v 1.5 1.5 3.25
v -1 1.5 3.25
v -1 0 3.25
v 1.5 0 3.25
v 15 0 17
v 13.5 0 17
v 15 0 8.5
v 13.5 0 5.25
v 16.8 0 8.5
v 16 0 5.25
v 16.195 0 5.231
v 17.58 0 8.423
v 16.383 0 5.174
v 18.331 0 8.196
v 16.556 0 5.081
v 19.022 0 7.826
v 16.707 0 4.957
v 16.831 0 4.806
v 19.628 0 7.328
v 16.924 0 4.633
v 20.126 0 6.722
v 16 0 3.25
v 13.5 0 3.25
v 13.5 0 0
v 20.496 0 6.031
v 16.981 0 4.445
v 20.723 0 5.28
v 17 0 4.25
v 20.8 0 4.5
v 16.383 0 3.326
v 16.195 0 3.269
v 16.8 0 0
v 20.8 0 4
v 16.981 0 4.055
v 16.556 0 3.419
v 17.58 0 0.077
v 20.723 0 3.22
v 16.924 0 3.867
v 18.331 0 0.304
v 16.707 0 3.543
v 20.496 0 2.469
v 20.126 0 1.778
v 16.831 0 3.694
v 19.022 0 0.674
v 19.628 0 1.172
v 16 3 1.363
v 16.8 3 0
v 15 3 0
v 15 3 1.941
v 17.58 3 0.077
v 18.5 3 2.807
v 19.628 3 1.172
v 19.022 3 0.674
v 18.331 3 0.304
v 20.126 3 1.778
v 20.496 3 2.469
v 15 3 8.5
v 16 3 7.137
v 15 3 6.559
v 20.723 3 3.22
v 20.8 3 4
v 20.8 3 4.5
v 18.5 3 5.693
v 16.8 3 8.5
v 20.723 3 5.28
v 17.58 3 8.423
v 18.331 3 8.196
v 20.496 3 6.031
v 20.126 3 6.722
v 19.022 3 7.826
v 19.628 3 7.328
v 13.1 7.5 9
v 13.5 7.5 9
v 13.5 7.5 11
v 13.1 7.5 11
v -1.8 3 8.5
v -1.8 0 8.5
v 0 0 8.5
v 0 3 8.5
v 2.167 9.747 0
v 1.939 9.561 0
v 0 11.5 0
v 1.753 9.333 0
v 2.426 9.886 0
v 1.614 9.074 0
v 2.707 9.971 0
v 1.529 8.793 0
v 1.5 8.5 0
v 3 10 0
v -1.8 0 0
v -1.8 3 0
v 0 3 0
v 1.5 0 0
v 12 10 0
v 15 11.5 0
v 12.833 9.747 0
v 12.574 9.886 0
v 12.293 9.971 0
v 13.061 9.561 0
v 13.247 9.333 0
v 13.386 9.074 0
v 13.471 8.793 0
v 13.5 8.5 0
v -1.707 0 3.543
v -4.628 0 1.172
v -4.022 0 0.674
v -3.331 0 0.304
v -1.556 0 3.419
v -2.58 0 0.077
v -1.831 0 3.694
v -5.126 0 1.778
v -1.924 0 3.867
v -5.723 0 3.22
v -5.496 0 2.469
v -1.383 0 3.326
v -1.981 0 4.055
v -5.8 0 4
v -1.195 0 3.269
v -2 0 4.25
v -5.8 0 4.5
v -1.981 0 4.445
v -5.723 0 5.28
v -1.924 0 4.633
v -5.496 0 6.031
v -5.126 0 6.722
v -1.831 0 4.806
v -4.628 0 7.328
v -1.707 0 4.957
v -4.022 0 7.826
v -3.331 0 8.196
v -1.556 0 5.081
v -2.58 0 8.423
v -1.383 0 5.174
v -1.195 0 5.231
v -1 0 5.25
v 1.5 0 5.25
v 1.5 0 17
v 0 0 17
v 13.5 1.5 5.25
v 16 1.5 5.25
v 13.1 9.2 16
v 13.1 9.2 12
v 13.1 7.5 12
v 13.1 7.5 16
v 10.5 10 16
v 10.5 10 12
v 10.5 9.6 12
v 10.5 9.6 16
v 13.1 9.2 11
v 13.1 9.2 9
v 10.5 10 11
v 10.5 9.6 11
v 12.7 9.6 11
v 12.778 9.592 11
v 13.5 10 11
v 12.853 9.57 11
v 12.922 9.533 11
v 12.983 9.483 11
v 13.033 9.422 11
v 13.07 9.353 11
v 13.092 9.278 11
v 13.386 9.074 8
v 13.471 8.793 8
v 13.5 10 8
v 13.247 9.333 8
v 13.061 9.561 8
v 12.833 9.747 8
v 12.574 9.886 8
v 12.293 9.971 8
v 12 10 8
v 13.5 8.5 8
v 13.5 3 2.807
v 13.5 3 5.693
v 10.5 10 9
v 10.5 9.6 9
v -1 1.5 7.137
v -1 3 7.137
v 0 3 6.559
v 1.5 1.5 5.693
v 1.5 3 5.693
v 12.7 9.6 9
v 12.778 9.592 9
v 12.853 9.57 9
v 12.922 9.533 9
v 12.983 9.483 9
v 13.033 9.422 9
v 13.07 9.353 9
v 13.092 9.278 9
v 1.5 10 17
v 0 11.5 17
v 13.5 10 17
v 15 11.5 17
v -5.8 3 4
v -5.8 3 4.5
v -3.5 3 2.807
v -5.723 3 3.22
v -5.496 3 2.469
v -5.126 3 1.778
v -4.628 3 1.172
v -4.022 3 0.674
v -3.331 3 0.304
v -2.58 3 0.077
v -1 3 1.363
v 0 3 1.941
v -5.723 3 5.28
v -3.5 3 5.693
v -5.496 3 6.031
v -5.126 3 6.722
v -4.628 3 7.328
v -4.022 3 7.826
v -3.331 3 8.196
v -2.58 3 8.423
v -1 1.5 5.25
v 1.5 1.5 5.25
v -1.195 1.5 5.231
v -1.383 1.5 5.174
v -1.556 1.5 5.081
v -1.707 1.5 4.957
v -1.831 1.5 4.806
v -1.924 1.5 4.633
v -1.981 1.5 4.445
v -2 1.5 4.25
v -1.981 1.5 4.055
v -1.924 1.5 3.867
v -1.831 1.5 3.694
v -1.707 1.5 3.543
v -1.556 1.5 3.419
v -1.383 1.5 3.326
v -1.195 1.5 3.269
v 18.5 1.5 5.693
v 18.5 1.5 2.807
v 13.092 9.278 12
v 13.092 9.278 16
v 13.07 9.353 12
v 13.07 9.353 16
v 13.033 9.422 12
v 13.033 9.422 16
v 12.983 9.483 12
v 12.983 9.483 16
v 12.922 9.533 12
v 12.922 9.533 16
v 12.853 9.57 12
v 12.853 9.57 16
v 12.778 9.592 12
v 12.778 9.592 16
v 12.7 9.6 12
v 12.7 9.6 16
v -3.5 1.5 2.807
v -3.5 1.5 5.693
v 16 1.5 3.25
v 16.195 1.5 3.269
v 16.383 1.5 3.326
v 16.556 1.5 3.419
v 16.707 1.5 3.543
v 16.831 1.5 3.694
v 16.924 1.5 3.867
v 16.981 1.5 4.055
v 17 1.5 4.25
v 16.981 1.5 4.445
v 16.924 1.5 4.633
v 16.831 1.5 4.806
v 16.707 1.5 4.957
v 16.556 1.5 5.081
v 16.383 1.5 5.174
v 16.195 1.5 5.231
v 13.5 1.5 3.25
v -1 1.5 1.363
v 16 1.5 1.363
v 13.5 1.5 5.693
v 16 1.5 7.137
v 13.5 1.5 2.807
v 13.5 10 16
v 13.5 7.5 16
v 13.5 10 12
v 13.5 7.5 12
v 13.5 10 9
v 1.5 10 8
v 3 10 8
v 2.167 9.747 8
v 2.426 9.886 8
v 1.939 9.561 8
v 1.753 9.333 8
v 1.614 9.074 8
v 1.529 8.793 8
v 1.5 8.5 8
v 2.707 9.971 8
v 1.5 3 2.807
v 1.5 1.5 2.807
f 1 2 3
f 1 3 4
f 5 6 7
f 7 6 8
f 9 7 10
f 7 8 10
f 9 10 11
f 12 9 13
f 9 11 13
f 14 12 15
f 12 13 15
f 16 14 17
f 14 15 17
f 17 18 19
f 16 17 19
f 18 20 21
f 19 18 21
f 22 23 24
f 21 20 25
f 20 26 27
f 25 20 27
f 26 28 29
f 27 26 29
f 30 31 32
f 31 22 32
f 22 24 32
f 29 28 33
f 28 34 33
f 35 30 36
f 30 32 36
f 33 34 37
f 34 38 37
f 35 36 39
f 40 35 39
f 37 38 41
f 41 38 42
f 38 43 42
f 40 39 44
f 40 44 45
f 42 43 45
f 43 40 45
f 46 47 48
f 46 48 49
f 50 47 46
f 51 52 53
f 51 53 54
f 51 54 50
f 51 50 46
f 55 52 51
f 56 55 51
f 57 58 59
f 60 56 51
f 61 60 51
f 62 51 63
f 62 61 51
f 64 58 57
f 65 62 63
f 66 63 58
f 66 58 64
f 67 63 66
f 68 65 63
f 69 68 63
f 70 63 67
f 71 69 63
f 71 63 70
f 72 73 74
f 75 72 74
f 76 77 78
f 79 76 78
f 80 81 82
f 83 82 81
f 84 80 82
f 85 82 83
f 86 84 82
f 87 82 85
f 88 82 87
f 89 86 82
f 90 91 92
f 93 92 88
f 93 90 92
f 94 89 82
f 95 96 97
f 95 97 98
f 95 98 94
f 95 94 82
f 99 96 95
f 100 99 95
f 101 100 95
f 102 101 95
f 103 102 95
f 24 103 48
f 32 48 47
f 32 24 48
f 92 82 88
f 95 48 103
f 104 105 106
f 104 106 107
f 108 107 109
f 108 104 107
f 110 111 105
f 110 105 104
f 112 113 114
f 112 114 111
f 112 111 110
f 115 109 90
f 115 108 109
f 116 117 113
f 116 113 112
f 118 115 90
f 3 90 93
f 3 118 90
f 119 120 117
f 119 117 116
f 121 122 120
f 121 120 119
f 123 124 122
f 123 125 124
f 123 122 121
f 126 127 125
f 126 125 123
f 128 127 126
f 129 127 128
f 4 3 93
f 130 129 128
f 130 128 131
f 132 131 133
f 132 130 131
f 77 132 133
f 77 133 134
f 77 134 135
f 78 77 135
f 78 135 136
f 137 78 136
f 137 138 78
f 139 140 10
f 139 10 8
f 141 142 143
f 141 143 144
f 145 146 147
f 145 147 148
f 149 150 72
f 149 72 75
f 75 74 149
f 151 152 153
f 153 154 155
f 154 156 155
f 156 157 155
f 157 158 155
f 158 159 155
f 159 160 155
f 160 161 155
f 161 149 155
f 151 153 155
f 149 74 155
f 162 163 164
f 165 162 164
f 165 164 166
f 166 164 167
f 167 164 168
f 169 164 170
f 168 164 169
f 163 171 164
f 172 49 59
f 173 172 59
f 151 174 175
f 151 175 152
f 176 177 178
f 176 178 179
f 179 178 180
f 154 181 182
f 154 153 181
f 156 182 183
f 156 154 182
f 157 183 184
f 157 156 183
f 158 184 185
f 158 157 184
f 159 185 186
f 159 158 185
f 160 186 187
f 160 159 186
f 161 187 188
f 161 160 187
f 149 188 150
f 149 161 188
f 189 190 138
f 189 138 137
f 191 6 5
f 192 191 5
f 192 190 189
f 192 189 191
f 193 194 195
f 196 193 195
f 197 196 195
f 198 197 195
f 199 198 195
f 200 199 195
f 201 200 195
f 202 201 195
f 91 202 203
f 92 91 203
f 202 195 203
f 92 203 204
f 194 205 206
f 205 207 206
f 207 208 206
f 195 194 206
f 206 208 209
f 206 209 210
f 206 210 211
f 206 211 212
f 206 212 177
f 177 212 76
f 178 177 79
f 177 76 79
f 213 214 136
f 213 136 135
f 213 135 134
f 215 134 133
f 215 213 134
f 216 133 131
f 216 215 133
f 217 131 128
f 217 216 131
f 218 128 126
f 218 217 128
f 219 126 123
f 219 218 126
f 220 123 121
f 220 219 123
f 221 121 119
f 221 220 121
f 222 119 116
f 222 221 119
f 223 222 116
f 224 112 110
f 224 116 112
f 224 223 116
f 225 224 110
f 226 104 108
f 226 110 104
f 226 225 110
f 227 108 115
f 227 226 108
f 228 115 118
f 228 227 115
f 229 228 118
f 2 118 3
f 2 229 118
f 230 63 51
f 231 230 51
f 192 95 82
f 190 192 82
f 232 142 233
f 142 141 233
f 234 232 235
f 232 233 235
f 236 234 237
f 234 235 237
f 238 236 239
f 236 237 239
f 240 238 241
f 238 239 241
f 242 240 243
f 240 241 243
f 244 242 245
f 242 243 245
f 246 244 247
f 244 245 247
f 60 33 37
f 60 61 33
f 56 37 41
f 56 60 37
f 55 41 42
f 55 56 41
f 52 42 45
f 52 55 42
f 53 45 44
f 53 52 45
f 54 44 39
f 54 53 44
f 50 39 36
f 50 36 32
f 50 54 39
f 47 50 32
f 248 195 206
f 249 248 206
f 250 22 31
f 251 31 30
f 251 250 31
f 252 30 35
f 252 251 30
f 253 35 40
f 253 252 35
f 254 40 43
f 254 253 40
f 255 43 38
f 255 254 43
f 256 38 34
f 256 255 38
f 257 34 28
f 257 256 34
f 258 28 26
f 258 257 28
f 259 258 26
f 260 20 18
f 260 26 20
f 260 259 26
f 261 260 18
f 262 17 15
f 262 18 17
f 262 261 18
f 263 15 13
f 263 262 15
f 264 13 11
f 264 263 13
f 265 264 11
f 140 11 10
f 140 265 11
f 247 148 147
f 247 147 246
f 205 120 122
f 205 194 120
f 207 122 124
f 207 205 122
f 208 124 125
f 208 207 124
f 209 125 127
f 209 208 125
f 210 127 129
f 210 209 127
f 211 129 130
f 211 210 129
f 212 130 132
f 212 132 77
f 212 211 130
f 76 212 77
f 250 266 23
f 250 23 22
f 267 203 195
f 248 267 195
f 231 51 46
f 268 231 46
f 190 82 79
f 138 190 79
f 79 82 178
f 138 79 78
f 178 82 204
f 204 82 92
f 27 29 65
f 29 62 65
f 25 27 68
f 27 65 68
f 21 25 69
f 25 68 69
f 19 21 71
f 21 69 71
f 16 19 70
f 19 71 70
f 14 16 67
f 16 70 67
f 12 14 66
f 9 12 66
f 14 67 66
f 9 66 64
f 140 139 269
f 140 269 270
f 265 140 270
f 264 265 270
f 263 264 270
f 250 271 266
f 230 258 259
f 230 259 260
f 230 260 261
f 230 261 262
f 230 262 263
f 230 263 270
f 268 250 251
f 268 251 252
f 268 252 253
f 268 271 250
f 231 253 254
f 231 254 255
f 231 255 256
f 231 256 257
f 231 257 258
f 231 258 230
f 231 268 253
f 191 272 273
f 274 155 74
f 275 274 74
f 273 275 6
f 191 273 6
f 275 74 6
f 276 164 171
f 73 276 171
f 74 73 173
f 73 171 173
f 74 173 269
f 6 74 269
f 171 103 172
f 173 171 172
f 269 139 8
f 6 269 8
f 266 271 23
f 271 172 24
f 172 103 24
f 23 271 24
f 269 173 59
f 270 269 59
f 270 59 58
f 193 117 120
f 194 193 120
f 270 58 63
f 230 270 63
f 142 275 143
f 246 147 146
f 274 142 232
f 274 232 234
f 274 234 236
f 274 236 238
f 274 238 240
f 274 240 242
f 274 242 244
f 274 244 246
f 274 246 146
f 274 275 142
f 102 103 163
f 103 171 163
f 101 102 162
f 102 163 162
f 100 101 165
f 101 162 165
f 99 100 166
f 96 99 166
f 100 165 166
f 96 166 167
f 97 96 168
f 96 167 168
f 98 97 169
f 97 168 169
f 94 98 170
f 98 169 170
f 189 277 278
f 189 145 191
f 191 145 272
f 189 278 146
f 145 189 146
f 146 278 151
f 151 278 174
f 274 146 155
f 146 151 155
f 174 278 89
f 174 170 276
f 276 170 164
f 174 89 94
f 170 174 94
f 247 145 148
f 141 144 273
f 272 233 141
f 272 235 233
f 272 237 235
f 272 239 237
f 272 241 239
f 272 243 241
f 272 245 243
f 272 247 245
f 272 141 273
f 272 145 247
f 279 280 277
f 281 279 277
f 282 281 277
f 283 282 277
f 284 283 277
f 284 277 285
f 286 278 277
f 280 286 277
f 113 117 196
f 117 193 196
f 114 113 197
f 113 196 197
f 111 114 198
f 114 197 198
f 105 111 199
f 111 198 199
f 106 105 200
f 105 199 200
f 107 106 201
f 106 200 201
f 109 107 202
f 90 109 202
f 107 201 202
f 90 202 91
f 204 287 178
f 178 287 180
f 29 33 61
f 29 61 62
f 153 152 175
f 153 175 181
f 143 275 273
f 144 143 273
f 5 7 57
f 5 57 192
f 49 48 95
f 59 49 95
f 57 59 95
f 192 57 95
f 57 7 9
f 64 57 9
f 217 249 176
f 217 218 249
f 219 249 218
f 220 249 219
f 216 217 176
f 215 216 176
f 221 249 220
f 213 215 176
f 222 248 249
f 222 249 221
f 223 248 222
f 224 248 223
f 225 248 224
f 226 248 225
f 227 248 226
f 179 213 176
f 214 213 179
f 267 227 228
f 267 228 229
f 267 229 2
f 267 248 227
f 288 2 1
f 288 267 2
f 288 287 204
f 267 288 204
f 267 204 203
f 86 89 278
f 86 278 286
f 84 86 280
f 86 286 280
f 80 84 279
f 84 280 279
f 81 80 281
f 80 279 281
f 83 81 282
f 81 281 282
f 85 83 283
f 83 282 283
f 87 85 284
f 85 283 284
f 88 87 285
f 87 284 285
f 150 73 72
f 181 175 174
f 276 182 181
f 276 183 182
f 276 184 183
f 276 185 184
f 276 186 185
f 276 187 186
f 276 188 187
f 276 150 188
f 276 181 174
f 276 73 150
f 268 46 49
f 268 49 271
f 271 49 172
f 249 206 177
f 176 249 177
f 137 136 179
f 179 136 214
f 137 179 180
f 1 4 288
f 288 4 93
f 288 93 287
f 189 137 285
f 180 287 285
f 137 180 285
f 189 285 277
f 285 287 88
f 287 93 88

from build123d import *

# Parameters (mm, degrees)
BOSS_EXTRUDE1_DEPTH    = 17
SKETCH10_W             = 3
SKETCH10_H             = 4
SKETCH10_H_2           = 2
BOSS_EXTRUDE8_DEPTH    = 0.4
SKETCH11_W             = 2
SKETCH11_H             = 2.1
SKETCH11_W_2           = 4
BOSS_EXTRUDE9_DEPTH    = 0.4
FILLET5_R              = 0.4
SPLIT2_SURFACE_1_BACK  = 26.421
SPLIT2_SURFACE_1_DEPTH = 52.842
SPLIT2_SURFACE_2_BACK  = 26.421
SPLIT2_SURFACE_2_DEPTH = 52.842
FILLET6_R              = 1.5
SKETCH13_W             = 5.8
SKETCH13_H             = 8.5
BOSS_EXTRUDE10_DEPTH   = 3
FILLET7_R              = 4
SPLIT3_SURFACE_3_BACK  = 34.598
SPLIT3_SURFACE_3_DEPTH = 69.196
SPLIT3_SURFACE_4_BACK  = 34.598
SPLIT3_SURFACE_4_DEPTH = 69.196
CUT_EXTRUDE1_DEPTH     = 1.5
CUT_EXTRUDE2_DEPTH     = 29.664263465


with BuildPart() as part:
    # Sketch1 → Boss-Extrude1 (new body)
    with BuildSketch(Plane.XY):
        Polygon((0, 0), (1.5, 0), (1.5, 10), (13.5, 10), (13.5, 0), (15, 0), (15, 11.5), (0, 11.5), (0, 10), align=None)
    extrude(amount=BOSS_EXTRUDE1_DEPTH)

    # Sketch10 → Boss-Extrude8 (add)
    with BuildSketch(Plane.XZ.offset(-10)):
        with Locations((12, 14)):
            Rectangle(SKETCH10_W, SKETCH10_H)
        with Locations((12, 10)):
            Rectangle(SKETCH10_W, SKETCH10_H_2)
    extrude(amount=BOSS_EXTRUDE8_DEPTH)

    # Sketch11 → Boss-Extrude9 (add)
    with BuildSketch(Plane.ZY.offset(-13.5)):
        with Locations((10, 8.55)):
            Rectangle(SKETCH11_W, SKETCH11_H)
        with Locations((14, 8.55)):
            Rectangle(SKETCH11_W_2, SKETCH11_H)
    extrude(amount=BOSS_EXTRUDE9_DEPTH)

    # Fillet5
    fillet5_edges = [part.edges().sort_by_distance(p)[0] for p in [
        (13.1, 9.6, 10),
        (13.1, 9.6, 14),
    ]]
    fillet(fillet5_edges, radius=FILLET5_R)


with BuildPart() as body_2:
    # Split2: the piece behind the surface
    add(part.part)
    # Split2 surface: a surface, the sketch's curves swept straight by 52.842 mm
    with BuildLine(Plane.XZ.offset(-SPLIT2_SURFACE_1_BACK), mode=Mode.PRIVATE) as split2_surface_1_path:
        Line((15, 8), (0, 8))
    split2_surface_1 = Shell.extrude(split2_surface_1_path.wire(), (0 * SPLIT2_SURFACE_1_DEPTH, -1 * SPLIT2_SURFACE_1_DEPTH, 0 * SPLIT2_SURFACE_1_DEPTH))
    split(bisect_by=split2_surface_1, keep=Keep.BOTTOM)


with BuildPart() as part_1:
    add(part.part)

    # Split2: split by a surface, the side it looks to stays
    # Split2 surface: a surface, the sketch's curves swept straight by 52.842 mm
    with BuildLine(Plane.XZ.offset(-SPLIT2_SURFACE_2_BACK), mode=Mode.PRIVATE) as split2_surface_2_path:
        Line((15, 8), (0, 8))
    split2_surface_2 = Shell.extrude(split2_surface_2_path.wire(), (0 * SPLIT2_SURFACE_2_DEPTH, -1 * SPLIT2_SURFACE_2_DEPTH, 0 * SPLIT2_SURFACE_2_DEPTH))
    split(bisect_by=split2_surface_2, keep=Keep.TOP)

    # Fillet6
    fillet6_edges = [part_1.edges().sort_by_distance(p)[0] for p in [
        (13.5, 10, 4),
        (1.5, 10, 4),
    ]]
    fillet(fillet6_edges, radius=FILLET6_R)


with BuildPart() as body_2_1:
    add(body_2.part)

    # Combine2: union part
    add(part_1.part)

    # Sketch13 → Boss-Extrude10 (add)
    with BuildSketch(Plane.XZ):
        with Locations((-2.9, 4.25)):
            Rectangle(SKETCH13_W, SKETCH13_H)
        with Locations((17.9, 4.25)):
            Rectangle(SKETCH13_W, SKETCH13_H)
    extrude(amount=-BOSS_EXTRUDE10_DEPTH)

    # Fillet7
    fillet7_edges = [body_2_1.edges().sort_by_distance(p)[0] for p in [
        (20.8, 1.5, 8.5),
        (20.8, 1.5, 0),
        (-5.8, 1.5, 0),
        (-5.8, 1.5, 8.5),
    ]]
    fillet(fillet7_edges, radius=FILLET7_R)


with BuildPart() as body_2_2:
    # Split3: the piece behind the surface
    add(body_2_1.part)
    # Split3 surface: a surface, the sketch's curves swept straight by 69.196 mm
    with BuildLine(Plane.ZY.offset(-SPLIT3_SURFACE_3_BACK), mode=Mode.PRIVATE) as split3_surface_3_path:
        Line((0, 3), (17, 3))
    split3_surface_3 = Shell.extrude(split3_surface_3_path.wire(), (-1 * SPLIT3_SURFACE_3_DEPTH, 0 * SPLIT3_SURFACE_3_DEPTH, 0 * SPLIT3_SURFACE_3_DEPTH))
    split(bisect_by=split3_surface_3, keep=Keep.BOTTOM)

    # Sketch16 → Cut-Extrude1 (cut)
    with BuildSketch(Plane(origin=(0, 3, 0), x_dir=(1, 0, 0), z_dir=(0, 1, 0))):
        Polygon((-1, -7.136751346), (1.5, -5.693375673), (1.5, -2.806624327), (-1, -1.363248654), (-3.5, -2.806624327), (-3.5, -5.693375673), align=None)
        Polygon((16, -1.363248654), (13.5, -2.806624327), (13.5, -5.693375673), (16, -7.136751346), (18.5, -5.693375673), (18.5, -2.806624327), align=None)
    extrude(amount=-CUT_EXTRUDE1_DEPTH, mode=Mode.SUBTRACT)

    # Sketch17 → Cut-Extrude2 (cut, through all)
    with BuildSketch(Plane(origin=(0, 1.5, 0), x_dir=(1, 0, 0), z_dir=(0, 1, 0))):
        with BuildLine():
            Line((16, -5.25), (13.5, -5.25))
            Line((13.5, -5.25), (13.5, -3.25))
            Line((13.5, -3.25), (16, -3.25))
            ThreePointArc((16, -3.25), (17, -4.25), (16, -5.25))
        make_face()
        with BuildLine():
            Line((1.5, -3.25), (1.5, -5.25))
            Line((1.5, -5.25), (-1, -5.25))
            ThreePointArc((-1, -5.25), (-2, -4.25), (-1, -3.25))
            Line((-1, -3.25), (1.5, -3.25))
        make_face()
    extrude(amount=-CUT_EXTRUDE2_DEPTH, mode=Mode.SUBTRACT)


with BuildPart() as body_2_3:
    add(body_2_1.part)

    # Split3: split by a surface, the side it looks to stays
    # Split3 surface: a surface, the sketch's curves swept straight by 69.196 mm
    with BuildLine(Plane.ZY.offset(-SPLIT3_SURFACE_4_BACK), mode=Mode.PRIVATE) as split3_surface_4_path:
        Line((0, 3), (17, 3))
    split3_surface_4 = Shell.extrude(split3_surface_4_path.wire(), (-1 * SPLIT3_SURFACE_4_DEPTH, 0 * SPLIT3_SURFACE_4_DEPTH, 0 * SPLIT3_SURFACE_4_DEPTH))
    split(bisect_by=split3_surface_4, keep=Keep.TOP)

    # Combine3: union body 2 2
    add(body_2_2.part)


solid = body_2_3.part
